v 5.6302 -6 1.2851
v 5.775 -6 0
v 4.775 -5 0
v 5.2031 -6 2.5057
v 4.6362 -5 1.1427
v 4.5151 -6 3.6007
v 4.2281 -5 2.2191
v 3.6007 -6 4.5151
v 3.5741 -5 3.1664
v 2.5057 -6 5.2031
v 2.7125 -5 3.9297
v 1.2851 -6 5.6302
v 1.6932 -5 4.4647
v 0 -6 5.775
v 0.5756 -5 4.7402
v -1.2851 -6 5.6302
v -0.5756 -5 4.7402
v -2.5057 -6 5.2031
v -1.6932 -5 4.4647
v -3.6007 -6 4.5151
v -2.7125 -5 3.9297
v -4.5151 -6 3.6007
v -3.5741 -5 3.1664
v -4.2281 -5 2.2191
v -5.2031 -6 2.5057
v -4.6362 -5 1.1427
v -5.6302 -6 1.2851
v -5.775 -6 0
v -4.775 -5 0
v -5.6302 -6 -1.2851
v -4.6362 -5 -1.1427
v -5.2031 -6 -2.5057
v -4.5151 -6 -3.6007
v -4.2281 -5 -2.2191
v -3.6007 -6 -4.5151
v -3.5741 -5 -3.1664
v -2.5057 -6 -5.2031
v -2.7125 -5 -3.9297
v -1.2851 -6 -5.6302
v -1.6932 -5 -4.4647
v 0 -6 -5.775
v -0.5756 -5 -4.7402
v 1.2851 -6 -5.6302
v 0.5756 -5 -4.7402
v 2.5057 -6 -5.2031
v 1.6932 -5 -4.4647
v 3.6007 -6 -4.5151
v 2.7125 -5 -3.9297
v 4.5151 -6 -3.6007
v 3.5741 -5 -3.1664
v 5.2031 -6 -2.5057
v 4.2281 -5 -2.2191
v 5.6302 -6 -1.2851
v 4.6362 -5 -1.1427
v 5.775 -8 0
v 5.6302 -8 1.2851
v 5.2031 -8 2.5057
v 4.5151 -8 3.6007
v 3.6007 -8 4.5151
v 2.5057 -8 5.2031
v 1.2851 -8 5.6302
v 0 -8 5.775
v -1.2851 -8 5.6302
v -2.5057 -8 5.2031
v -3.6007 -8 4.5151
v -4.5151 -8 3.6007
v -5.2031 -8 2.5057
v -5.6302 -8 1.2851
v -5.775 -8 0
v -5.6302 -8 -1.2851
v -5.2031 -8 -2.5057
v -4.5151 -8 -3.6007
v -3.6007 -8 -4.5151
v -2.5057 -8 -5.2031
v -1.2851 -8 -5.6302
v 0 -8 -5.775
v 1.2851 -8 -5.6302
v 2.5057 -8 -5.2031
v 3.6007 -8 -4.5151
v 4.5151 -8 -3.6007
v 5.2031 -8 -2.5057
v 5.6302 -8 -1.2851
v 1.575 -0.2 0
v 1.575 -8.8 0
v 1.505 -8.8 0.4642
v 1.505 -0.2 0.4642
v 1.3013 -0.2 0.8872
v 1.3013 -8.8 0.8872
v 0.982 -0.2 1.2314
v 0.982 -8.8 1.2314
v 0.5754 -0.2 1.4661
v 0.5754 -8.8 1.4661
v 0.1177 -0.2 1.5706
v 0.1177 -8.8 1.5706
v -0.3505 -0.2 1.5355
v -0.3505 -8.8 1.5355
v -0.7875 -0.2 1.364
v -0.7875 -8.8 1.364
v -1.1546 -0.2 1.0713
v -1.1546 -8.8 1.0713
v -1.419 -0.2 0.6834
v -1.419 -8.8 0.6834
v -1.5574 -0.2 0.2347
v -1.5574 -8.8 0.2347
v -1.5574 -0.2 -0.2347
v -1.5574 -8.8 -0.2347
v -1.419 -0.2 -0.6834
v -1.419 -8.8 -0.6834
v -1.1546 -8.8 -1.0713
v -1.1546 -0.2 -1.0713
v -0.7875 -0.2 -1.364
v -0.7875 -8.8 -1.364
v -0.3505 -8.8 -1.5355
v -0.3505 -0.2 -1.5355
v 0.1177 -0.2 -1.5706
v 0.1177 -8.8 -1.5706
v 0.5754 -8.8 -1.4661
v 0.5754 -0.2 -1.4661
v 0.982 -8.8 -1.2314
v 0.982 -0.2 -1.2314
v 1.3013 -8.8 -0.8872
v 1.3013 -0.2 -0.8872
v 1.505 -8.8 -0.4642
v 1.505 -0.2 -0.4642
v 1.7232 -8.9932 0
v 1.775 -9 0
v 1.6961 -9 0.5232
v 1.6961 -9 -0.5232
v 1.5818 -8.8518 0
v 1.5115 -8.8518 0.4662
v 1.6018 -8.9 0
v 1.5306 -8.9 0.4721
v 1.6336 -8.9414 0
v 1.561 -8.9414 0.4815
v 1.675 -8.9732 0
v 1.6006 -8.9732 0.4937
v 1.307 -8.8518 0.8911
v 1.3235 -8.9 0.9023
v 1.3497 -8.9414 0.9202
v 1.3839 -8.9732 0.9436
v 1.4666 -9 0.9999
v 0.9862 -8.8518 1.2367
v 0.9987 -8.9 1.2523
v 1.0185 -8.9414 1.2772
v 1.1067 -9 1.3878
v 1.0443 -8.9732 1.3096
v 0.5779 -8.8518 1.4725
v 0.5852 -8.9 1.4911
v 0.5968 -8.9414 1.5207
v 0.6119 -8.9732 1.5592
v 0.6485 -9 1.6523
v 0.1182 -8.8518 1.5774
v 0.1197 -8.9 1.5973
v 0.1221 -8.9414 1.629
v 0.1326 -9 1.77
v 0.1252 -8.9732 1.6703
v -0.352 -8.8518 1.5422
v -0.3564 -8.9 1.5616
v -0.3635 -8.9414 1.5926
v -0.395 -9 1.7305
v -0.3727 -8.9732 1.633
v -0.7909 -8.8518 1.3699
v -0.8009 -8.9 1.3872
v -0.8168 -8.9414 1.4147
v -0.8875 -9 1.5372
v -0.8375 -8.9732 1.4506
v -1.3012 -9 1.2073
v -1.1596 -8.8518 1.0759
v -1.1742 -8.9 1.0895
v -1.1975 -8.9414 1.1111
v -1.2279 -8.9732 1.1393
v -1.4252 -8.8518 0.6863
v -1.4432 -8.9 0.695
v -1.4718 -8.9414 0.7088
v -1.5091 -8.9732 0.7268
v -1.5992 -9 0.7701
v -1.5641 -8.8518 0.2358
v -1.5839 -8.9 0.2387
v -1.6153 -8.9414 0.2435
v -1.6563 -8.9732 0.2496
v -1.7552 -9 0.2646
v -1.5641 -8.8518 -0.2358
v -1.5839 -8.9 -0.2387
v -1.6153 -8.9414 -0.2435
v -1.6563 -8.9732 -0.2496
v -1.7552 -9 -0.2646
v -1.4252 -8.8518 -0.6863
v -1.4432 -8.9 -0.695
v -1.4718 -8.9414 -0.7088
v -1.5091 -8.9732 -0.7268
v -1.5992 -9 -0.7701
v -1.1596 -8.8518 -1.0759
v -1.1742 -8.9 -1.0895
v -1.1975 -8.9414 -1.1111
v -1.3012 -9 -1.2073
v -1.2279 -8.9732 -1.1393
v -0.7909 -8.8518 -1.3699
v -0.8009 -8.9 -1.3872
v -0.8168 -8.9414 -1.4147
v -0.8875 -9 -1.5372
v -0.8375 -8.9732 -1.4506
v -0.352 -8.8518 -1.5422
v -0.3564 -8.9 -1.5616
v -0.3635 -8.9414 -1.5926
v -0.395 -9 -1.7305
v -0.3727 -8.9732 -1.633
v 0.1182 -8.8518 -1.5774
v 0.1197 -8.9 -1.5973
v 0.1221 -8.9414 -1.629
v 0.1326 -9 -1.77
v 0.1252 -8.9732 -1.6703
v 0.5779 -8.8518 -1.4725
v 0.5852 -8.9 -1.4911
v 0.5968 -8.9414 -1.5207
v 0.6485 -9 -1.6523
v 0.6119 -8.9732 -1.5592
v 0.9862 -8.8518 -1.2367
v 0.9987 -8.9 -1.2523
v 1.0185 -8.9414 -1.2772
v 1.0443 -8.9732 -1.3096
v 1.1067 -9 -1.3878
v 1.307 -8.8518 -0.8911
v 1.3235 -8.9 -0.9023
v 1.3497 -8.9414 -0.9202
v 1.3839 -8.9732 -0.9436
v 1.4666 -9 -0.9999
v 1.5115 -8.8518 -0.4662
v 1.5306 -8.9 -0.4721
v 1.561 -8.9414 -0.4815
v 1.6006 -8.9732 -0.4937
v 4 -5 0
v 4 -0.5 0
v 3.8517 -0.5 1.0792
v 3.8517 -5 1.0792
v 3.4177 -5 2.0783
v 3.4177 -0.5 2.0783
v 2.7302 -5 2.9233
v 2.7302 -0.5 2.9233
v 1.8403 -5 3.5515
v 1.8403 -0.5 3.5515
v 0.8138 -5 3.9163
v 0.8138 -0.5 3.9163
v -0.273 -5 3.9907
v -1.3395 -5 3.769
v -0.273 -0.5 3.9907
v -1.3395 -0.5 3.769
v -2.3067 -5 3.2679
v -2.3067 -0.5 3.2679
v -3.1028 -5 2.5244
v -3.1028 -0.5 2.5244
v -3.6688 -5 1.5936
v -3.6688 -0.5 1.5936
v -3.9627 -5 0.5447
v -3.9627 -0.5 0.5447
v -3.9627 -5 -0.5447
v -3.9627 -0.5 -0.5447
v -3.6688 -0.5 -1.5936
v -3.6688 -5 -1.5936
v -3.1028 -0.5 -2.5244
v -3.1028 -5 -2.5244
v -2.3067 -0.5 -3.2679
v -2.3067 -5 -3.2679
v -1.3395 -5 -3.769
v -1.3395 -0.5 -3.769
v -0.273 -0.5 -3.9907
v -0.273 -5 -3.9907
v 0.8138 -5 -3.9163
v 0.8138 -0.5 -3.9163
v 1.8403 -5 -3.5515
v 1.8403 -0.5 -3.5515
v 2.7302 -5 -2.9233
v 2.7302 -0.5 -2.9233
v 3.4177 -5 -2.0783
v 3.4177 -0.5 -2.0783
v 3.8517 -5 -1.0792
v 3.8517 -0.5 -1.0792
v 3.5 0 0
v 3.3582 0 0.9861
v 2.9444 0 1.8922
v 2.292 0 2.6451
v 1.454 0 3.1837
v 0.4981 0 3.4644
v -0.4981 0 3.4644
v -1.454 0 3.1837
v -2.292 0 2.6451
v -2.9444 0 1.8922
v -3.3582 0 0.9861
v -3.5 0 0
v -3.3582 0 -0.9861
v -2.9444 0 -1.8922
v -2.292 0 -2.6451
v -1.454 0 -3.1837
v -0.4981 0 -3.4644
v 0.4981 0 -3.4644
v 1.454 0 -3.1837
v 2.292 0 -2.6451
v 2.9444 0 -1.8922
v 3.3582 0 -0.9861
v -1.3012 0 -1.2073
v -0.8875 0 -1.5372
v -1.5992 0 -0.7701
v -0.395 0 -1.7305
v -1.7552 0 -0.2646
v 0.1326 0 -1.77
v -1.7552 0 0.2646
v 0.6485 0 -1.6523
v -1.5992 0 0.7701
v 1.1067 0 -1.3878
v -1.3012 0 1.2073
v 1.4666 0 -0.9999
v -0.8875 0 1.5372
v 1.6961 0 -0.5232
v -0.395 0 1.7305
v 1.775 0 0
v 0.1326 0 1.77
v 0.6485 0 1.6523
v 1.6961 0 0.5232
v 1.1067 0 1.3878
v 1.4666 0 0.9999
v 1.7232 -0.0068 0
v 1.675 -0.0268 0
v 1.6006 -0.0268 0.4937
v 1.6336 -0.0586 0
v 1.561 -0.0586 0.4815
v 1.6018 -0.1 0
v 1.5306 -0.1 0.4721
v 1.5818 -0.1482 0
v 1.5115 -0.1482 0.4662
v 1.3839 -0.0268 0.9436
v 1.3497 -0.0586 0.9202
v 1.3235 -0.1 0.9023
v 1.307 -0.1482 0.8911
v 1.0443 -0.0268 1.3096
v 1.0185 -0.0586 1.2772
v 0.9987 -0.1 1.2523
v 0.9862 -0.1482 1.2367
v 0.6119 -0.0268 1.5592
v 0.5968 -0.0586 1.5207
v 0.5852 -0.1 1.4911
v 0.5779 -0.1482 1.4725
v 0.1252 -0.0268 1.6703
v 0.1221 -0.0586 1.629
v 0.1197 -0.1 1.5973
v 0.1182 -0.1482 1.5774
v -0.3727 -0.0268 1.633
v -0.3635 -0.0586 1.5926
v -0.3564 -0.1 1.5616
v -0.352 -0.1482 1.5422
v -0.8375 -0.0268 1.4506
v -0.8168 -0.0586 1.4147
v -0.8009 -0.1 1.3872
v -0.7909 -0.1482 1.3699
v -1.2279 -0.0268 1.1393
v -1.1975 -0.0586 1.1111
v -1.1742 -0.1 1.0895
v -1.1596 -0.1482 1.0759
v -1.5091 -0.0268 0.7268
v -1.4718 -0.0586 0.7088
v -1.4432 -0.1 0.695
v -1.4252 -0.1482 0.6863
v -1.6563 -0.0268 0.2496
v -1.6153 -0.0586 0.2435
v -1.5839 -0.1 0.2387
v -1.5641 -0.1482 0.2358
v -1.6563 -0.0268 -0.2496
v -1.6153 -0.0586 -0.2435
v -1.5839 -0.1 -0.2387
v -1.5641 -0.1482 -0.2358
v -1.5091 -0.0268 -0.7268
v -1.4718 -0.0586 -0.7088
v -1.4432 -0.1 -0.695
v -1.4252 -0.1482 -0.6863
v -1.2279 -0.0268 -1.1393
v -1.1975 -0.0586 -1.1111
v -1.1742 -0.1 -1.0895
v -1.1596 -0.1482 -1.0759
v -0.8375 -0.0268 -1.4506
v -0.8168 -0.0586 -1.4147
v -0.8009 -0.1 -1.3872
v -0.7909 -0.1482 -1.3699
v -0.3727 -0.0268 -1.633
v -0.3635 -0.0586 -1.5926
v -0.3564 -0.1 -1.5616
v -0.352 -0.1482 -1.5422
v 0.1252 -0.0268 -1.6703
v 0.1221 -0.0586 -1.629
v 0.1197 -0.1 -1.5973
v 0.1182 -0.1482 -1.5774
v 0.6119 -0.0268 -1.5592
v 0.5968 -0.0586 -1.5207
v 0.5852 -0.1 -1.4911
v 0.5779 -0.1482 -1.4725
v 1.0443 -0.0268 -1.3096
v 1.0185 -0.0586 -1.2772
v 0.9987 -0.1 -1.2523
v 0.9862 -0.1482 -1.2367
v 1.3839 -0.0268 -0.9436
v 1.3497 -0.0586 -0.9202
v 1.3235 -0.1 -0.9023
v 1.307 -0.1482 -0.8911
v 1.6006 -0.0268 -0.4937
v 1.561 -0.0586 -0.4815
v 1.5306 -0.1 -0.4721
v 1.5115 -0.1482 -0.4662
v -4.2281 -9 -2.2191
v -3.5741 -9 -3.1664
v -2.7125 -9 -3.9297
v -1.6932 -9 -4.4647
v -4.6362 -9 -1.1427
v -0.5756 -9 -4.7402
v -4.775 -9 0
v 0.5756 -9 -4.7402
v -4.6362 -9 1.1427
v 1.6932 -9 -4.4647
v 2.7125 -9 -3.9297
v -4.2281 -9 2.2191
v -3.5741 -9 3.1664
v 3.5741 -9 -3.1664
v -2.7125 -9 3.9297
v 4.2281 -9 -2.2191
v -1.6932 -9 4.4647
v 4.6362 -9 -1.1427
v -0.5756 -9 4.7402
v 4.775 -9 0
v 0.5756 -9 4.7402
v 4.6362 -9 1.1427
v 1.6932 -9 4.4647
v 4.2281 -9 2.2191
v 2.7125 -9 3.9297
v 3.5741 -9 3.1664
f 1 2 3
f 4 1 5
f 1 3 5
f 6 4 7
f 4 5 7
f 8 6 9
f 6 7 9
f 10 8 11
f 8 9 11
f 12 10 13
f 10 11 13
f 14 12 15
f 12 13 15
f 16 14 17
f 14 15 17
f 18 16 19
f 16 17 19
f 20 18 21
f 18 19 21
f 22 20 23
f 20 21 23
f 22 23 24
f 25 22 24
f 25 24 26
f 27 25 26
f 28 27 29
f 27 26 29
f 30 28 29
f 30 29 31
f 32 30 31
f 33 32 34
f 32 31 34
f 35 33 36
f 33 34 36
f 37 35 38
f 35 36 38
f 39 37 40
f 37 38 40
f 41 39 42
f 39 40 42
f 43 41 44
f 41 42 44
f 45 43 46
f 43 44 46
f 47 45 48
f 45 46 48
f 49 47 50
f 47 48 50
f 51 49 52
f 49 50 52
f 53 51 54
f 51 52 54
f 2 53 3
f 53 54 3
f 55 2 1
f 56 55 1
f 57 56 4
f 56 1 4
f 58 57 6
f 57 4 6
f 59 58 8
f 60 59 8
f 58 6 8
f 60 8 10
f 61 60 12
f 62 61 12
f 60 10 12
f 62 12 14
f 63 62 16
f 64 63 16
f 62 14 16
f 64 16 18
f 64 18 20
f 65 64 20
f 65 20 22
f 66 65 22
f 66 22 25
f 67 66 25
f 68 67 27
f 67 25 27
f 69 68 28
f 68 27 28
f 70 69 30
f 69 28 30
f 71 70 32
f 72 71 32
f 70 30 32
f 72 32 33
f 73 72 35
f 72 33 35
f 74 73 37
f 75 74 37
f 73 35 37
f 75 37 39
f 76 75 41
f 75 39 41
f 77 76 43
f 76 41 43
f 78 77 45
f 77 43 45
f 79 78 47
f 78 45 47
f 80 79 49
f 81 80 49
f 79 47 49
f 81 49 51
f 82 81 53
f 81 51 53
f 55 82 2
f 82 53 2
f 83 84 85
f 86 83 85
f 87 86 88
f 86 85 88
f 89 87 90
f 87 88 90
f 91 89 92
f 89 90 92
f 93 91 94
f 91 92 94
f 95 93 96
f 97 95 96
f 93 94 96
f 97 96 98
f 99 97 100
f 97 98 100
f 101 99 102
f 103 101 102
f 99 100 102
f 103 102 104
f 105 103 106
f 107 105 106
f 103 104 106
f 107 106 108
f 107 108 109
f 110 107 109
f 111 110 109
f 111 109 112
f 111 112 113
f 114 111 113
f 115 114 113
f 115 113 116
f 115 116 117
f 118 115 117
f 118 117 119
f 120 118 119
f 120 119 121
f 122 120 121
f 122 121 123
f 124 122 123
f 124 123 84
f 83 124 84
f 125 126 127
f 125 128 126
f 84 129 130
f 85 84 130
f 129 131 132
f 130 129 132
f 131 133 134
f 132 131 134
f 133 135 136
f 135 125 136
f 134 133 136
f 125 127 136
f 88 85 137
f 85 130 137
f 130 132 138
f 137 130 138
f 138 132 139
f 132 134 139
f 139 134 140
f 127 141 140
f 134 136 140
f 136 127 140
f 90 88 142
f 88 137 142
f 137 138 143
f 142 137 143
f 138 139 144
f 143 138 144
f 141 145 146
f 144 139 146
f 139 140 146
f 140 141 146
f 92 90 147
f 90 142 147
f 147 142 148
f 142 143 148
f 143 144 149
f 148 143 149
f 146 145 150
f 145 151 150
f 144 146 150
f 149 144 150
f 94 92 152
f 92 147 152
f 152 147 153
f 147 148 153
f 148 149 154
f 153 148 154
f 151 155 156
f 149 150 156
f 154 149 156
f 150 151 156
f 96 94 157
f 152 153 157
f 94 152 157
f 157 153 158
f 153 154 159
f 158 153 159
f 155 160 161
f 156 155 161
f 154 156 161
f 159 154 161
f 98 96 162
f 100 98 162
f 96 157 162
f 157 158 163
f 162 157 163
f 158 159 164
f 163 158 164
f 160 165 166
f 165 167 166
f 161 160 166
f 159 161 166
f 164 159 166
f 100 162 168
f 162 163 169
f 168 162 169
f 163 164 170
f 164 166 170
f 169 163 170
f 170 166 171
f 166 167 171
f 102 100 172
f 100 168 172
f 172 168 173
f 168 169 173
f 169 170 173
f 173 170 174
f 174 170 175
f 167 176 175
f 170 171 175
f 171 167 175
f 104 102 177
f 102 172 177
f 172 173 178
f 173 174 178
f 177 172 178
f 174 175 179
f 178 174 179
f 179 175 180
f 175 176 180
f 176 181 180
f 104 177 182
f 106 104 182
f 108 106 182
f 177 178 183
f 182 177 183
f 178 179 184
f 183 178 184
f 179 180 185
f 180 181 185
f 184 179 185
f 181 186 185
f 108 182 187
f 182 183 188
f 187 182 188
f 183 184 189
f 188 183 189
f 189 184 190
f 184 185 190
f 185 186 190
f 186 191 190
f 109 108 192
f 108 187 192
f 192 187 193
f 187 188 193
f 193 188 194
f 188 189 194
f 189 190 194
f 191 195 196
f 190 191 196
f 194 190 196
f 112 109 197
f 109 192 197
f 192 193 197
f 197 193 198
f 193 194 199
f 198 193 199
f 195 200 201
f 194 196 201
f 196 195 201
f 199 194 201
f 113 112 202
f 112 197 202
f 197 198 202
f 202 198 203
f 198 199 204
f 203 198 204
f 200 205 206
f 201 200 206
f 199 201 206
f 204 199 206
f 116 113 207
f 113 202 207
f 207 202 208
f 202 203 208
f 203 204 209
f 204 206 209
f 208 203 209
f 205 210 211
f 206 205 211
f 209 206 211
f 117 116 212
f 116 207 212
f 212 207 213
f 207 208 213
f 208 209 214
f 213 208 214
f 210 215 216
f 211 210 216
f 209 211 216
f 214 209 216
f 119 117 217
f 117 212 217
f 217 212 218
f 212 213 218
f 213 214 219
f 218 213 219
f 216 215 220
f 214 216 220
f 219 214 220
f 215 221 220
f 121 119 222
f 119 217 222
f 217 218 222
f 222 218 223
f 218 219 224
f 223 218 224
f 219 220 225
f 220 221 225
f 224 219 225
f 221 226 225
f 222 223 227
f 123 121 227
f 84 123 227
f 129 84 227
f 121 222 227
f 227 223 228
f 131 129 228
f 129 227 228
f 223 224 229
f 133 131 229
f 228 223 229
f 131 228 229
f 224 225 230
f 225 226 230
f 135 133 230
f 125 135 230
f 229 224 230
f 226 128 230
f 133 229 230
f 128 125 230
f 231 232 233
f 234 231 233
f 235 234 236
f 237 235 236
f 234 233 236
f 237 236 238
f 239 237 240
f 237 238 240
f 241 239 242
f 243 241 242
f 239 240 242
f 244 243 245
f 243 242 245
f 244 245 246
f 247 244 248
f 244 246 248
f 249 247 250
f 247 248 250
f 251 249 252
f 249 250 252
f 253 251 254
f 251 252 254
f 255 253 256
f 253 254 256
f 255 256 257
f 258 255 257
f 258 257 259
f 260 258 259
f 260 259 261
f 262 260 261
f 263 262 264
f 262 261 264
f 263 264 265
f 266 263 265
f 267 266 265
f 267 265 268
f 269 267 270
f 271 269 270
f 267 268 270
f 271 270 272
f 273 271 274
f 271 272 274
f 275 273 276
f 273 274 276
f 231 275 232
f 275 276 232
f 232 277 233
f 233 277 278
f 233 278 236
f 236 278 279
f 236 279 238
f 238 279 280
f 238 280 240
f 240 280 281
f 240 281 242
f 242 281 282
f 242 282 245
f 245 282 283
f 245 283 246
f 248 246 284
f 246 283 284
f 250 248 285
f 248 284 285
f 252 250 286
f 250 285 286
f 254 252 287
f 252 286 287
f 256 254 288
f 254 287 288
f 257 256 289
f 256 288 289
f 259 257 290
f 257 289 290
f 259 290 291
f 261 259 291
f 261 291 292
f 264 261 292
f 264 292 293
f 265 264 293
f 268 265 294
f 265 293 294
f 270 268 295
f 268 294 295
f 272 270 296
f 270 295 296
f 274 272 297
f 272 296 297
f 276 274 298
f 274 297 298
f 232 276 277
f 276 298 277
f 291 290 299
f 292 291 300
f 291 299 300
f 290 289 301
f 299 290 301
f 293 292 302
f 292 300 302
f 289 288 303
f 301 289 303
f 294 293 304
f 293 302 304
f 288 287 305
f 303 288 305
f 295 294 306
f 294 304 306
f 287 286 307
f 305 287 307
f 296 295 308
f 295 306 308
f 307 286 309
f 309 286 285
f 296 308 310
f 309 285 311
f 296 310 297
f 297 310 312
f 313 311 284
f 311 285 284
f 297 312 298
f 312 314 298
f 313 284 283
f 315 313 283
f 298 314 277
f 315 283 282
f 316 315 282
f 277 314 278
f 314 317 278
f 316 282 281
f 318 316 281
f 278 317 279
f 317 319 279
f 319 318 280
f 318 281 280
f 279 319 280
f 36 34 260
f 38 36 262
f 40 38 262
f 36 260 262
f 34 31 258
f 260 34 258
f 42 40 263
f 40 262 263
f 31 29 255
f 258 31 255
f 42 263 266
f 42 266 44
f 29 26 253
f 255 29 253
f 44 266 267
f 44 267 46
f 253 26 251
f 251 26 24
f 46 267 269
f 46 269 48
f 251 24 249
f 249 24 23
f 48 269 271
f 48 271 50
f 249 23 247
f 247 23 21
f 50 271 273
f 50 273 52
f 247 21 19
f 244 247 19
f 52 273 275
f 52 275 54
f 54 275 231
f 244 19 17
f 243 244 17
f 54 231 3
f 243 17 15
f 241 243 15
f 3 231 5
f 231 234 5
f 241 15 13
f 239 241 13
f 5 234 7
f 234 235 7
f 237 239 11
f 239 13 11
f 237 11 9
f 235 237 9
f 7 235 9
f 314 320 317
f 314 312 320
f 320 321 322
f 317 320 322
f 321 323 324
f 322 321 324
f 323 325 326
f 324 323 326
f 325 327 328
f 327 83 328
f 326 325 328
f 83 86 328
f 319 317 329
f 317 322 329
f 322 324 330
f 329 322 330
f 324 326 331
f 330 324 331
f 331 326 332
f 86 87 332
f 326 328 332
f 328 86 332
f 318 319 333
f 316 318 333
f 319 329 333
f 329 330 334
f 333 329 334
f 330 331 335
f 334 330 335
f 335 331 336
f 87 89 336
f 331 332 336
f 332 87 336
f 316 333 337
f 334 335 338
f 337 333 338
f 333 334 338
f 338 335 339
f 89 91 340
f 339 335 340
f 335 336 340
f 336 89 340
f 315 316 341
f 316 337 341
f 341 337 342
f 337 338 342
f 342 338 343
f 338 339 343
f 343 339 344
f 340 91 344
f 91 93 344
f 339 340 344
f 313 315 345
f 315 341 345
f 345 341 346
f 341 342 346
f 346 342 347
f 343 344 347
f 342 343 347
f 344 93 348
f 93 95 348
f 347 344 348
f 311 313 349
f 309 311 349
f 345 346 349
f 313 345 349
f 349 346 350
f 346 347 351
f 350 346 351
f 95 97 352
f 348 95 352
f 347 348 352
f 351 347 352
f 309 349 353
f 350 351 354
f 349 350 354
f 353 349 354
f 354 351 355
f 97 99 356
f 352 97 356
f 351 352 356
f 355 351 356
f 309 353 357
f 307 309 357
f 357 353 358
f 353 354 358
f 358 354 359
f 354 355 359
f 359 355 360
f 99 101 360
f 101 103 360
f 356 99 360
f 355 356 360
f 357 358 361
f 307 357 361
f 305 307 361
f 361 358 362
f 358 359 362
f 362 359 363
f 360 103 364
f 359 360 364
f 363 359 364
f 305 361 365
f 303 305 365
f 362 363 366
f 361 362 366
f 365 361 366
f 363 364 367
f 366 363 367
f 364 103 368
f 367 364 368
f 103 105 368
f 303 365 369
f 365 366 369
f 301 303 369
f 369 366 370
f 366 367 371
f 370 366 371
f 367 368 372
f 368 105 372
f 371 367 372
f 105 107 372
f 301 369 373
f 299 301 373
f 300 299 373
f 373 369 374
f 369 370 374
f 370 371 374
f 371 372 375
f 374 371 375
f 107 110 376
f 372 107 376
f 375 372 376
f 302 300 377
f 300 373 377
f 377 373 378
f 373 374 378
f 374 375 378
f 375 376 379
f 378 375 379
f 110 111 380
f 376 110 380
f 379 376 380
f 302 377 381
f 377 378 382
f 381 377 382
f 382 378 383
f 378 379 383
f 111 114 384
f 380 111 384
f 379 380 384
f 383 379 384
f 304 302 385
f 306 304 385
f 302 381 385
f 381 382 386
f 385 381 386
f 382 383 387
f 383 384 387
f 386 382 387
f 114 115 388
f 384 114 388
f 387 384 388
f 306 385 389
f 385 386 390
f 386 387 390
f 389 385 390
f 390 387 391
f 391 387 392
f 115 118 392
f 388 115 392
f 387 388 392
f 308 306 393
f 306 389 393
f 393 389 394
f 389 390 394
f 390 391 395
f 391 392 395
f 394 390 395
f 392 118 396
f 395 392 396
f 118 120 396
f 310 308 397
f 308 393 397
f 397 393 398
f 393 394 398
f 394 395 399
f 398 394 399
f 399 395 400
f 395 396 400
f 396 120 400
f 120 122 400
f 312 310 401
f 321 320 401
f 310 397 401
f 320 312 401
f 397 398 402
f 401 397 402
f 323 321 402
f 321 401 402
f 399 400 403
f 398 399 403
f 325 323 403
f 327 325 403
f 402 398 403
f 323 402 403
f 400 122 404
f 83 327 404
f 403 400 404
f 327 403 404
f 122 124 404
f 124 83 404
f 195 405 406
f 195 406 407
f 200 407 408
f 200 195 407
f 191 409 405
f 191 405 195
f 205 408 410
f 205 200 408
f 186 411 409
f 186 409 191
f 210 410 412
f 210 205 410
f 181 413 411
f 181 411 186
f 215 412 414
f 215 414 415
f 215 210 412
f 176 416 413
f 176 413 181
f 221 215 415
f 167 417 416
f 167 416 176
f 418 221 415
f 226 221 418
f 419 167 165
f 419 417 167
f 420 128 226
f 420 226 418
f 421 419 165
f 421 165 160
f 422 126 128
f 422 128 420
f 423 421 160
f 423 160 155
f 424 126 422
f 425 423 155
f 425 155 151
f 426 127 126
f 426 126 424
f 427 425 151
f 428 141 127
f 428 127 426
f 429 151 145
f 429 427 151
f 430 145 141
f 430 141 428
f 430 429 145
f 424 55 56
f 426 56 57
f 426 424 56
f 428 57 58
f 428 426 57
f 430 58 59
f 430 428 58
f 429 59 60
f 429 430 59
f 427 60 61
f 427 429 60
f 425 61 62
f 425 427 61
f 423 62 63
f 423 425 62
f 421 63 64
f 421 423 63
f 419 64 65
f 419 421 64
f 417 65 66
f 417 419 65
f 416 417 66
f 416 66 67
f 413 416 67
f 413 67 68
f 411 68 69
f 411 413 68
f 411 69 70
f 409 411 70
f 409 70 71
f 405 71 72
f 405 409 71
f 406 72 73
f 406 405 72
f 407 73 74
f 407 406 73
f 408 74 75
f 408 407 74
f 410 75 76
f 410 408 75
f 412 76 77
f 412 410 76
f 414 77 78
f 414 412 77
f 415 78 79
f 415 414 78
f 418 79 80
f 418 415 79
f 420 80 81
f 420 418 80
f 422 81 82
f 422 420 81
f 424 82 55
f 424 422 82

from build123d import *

# Parameters (mm, degrees)
F0_R     = 4
F1_DEPTH = 5
F2_R     = 5.775
F2_R_2   = 4
F3_DEPTH = 4
F4_R     = 1.575
F5_DEPTH = 10
F6_SIZE  = 1
F7_SIZE  = 0.5
F8_R     = 0.2


with BuildPart() as f1:
    # F0 (on Front) → F1 (new body)
    with BuildSketch(Plane.XZ):
        Circle(F0_R)
    extrude(amount=F1_DEPTH)

    # F2 (on face) → F3 (join)
    with BuildSketch(Plane.XZ.offset(5)):
        Circle(F2_R)
        Circle(F2_R_2, mode=Mode.SUBTRACT)
        Circle(F2_R_2)
    extrude(amount=F3_DEPTH)

    # F4 (on face) → F5 (cut)
    with BuildSketch(Plane.XZ.offset(9)):
        Circle(F4_R)
    extrude(amount=-F5_DEPTH, mode=Mode.SUBTRACT)

    # F6
    f6_edges = [f1.edges().sort_by_distance(p)[0] for p in [
        (-5.775, -9, 0),
        (-5.775, -5, 0),
    ]]
    chamfer(f6_edges, length=F6_SIZE)

    # F7
    f7_edges = [f1.edges().sort_by_distance(p)[0] for p in [
        (-4, 0, 0),
    ]]
    chamfer(f7_edges, length=F7_SIZE)

    # F8
    f8_edges = [f1.edges().sort_by_distance(p)[0] for p in [
        (-1.575, -9, 0),
        (-1.575, 0, 0),
    ]]
    fillet(f8_edges, radius=F8_R)


solid = f1.part
